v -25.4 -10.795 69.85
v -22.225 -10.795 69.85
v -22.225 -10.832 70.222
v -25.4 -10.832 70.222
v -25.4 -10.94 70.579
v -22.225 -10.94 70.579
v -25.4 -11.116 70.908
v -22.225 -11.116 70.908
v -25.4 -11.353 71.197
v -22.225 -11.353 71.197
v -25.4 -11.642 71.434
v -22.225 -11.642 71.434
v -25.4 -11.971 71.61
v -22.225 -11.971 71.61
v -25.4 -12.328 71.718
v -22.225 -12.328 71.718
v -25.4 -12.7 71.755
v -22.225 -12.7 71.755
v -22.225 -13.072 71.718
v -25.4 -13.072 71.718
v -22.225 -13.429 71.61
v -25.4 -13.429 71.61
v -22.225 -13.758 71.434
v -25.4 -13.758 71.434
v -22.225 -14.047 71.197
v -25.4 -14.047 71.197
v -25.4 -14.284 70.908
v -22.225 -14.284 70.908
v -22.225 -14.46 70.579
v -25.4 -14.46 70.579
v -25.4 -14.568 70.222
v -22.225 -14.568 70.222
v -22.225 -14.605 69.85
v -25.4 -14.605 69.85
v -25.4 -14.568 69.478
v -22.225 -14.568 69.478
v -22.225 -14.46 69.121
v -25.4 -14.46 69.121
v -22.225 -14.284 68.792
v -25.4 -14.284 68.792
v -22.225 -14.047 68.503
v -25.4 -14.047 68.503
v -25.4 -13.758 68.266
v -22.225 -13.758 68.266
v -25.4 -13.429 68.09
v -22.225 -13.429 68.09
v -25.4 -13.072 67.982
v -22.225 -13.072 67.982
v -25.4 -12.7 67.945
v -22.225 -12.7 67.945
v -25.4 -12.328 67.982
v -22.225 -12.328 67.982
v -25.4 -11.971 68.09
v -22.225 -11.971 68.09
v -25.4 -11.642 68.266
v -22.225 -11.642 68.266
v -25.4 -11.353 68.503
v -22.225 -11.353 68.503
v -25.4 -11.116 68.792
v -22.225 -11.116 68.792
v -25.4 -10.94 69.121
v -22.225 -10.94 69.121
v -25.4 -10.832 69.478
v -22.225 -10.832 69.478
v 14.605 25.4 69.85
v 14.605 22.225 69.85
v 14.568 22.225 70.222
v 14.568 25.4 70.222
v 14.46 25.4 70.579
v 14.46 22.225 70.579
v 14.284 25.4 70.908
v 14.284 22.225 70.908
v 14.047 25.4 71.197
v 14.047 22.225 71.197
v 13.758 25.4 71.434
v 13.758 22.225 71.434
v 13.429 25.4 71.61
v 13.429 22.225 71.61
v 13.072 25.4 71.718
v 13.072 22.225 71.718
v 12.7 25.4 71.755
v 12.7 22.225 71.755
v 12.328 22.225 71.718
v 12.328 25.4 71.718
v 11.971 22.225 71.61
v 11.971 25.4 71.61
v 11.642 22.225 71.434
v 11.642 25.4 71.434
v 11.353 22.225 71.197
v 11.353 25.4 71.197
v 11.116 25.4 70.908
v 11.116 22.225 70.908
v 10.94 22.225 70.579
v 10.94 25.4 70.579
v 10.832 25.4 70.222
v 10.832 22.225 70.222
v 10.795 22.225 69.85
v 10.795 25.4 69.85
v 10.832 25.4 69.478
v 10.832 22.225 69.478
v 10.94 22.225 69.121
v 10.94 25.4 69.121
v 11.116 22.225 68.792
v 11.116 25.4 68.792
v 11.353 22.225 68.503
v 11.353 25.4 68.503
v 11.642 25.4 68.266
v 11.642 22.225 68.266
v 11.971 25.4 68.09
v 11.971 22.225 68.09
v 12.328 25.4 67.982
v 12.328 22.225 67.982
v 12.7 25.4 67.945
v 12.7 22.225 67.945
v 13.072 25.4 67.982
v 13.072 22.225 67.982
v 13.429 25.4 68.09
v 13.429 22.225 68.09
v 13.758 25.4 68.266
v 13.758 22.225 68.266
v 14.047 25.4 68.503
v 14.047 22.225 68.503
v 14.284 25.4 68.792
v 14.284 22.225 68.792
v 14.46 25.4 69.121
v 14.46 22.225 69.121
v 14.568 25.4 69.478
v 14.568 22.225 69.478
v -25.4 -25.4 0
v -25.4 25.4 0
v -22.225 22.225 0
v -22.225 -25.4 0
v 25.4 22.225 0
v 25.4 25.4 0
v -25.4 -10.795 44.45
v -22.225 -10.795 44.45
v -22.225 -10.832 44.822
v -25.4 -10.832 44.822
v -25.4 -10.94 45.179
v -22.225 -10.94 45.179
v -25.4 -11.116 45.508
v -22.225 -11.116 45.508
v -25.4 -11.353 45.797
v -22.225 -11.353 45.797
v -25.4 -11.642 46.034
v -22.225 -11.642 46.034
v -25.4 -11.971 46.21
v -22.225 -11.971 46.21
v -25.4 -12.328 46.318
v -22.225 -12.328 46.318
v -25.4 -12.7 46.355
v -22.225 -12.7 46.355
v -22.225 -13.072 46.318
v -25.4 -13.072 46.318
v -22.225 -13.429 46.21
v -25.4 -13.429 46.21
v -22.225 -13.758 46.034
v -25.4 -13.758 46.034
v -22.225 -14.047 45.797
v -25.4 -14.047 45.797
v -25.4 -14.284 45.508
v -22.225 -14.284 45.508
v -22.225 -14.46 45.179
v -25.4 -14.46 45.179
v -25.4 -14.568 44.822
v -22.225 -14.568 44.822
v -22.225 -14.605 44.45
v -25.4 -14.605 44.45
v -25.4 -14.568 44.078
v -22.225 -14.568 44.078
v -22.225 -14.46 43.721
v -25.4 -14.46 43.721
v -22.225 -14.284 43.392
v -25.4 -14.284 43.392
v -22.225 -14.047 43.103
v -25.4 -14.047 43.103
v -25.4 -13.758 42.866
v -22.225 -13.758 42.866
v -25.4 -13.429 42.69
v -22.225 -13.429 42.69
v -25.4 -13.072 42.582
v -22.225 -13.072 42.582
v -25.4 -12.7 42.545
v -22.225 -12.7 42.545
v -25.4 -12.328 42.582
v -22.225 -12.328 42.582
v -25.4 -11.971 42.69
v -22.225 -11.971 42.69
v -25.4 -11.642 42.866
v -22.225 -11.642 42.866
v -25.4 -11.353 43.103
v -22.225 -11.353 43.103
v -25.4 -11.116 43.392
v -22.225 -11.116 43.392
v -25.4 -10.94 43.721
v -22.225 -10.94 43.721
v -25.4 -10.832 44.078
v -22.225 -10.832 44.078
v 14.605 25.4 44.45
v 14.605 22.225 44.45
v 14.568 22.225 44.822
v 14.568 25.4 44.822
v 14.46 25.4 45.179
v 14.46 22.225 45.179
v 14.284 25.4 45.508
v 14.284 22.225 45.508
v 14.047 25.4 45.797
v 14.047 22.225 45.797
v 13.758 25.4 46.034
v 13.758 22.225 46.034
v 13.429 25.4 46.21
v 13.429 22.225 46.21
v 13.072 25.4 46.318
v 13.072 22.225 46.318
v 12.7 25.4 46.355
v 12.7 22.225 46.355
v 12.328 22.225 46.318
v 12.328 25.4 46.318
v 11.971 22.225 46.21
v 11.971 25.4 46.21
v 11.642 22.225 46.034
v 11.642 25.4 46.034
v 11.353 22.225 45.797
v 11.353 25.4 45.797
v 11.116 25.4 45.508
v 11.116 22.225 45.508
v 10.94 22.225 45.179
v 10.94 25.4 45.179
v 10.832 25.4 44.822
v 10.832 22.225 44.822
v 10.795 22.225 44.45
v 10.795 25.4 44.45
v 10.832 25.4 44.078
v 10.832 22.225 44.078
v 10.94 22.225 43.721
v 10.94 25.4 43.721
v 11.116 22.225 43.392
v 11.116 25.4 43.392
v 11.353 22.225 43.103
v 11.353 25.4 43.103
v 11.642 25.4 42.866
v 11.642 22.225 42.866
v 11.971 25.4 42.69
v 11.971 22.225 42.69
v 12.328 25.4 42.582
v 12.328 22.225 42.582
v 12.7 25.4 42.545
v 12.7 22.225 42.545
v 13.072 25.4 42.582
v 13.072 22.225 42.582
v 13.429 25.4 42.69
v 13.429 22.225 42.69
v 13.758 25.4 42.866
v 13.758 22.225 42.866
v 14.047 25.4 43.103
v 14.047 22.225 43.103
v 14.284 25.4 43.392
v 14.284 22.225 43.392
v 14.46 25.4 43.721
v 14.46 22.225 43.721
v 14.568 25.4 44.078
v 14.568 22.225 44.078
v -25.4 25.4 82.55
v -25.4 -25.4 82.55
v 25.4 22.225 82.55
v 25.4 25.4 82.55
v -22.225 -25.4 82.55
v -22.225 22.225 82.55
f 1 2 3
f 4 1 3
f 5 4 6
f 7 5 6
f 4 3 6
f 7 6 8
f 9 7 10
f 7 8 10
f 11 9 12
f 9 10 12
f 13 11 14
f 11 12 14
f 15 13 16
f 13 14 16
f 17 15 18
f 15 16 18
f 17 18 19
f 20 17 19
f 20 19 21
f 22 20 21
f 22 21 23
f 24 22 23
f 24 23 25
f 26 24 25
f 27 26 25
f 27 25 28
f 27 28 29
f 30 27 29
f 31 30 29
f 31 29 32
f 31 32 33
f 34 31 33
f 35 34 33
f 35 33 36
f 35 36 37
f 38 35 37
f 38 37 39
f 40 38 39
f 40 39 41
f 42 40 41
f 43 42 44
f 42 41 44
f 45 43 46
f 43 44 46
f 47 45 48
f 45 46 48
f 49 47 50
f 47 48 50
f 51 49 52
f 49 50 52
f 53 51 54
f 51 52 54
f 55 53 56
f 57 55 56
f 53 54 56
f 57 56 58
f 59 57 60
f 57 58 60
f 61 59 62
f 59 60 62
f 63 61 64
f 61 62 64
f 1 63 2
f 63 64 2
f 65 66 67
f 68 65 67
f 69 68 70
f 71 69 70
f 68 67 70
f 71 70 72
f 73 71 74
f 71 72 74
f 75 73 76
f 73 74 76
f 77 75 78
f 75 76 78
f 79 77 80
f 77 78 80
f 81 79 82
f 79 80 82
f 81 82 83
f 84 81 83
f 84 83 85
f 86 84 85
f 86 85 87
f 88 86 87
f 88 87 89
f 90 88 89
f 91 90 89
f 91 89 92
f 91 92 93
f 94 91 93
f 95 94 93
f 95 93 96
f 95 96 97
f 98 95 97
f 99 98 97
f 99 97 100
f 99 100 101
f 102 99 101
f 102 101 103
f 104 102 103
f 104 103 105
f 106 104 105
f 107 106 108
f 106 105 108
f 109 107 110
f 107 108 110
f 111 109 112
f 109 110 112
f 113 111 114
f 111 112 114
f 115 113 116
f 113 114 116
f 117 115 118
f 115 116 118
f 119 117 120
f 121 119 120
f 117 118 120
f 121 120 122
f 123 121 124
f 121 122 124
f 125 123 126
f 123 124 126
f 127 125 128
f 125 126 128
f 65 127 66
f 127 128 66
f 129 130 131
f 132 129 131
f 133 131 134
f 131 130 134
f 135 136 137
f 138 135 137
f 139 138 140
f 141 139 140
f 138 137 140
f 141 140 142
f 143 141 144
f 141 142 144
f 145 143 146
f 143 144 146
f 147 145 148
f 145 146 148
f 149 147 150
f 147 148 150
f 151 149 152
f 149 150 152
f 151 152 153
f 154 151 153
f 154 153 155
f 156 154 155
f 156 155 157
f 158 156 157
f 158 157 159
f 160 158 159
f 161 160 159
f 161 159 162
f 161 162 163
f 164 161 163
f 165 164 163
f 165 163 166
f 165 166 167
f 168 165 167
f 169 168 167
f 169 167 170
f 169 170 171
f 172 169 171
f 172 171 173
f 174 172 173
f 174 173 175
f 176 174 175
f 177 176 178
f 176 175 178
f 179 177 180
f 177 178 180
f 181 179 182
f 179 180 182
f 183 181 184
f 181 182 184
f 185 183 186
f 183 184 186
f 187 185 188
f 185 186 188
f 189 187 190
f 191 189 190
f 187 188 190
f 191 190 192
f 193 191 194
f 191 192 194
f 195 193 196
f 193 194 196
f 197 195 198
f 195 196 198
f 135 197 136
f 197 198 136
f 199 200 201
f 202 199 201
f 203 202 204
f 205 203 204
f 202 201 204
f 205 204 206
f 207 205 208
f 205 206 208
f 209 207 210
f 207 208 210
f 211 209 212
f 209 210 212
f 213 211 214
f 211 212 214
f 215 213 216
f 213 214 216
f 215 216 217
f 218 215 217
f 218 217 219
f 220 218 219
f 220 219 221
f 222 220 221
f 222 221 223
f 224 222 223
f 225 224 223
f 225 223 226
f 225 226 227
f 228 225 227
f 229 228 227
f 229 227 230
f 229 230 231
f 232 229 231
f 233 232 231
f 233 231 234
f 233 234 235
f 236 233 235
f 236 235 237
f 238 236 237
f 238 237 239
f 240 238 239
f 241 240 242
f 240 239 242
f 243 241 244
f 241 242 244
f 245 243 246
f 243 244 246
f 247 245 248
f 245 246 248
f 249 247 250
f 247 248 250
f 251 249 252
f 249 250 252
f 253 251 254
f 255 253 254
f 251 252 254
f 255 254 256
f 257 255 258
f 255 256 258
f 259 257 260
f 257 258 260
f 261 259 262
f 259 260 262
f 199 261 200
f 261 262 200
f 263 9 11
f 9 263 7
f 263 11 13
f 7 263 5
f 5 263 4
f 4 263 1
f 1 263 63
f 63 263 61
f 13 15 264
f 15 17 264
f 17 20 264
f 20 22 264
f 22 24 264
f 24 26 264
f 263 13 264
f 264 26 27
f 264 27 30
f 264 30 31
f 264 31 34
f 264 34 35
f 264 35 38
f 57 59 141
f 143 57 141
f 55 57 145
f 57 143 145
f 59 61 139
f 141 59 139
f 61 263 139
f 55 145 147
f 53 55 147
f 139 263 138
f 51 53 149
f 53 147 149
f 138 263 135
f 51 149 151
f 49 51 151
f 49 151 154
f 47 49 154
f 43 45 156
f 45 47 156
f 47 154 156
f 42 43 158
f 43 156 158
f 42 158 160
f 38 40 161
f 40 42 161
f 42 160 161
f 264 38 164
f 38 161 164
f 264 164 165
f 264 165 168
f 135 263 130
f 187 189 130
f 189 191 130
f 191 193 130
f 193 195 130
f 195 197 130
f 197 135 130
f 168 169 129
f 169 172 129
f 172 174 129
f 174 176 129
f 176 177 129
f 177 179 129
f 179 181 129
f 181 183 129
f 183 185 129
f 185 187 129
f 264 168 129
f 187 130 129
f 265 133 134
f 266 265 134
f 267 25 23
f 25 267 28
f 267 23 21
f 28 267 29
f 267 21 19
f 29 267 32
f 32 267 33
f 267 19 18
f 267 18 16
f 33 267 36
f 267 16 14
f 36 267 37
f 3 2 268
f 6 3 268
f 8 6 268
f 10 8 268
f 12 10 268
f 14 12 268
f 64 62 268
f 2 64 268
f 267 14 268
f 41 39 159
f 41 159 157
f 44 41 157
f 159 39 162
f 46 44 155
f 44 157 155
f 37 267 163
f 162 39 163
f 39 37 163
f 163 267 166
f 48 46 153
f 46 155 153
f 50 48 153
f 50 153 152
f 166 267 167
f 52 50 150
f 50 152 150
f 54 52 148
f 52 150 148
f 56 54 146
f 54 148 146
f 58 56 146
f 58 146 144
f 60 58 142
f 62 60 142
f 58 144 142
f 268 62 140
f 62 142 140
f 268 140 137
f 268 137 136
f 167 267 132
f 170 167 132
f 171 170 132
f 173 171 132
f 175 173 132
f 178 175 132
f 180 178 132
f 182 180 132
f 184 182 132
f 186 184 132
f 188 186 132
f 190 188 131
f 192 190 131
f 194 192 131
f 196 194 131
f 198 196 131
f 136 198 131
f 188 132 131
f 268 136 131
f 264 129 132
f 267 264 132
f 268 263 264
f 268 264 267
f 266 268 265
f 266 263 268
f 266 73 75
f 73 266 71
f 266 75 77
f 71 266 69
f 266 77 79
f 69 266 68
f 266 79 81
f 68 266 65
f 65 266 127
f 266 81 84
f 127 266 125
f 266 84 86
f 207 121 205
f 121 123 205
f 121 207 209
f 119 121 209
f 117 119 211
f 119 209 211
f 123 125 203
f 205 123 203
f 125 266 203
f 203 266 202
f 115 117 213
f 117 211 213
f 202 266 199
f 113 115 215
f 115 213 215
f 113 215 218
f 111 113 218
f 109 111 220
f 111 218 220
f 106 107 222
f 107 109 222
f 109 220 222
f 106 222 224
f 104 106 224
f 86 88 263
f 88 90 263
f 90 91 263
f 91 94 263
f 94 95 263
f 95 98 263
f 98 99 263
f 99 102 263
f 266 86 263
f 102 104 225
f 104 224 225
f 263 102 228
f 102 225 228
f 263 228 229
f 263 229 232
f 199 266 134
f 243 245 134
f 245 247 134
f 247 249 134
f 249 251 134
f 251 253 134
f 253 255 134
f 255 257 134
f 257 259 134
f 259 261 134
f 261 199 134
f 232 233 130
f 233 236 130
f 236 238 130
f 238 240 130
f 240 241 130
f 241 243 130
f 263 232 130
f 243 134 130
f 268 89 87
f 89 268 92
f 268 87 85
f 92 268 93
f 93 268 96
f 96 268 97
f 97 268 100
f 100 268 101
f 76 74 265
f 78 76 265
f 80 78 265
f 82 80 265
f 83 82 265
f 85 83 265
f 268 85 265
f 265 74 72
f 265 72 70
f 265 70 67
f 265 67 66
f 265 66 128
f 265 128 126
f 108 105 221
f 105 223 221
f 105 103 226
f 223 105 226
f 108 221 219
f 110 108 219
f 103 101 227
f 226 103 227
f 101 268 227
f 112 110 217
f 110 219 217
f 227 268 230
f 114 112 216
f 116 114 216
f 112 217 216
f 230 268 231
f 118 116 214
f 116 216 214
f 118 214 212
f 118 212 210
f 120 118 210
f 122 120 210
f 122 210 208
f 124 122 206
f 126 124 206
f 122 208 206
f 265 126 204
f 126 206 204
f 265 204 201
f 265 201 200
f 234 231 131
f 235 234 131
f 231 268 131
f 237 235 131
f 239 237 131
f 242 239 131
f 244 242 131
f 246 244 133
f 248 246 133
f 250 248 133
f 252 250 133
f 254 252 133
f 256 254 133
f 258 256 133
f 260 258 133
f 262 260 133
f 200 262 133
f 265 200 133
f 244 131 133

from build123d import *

# Parameters (mm, degrees)
F1_DEPTH = 82.55
F3_D     = 3.81
F5_D     = 3.81


with BuildPart() as f1:
    # F0 (on Top) → F1 (new body)
    with BuildSketch(Plane.XY):
        Polygon((25.4, 25.4), (-25.4, 25.4), (-25.4, -25.4), (-22.225, -25.4), (-22.225, 22.225), (25.4, 22.225), align=None)
    extrude(amount=F1_DEPTH)

    # F3 (through all)
    with Locations(Plane(origin=(-25.4, 0, 0), x_dir=(0, -1, 0), z_dir=(-1, 0, 0))):
        with Locations((12.7, 69.85), (12.7, 44.45)):
            Hole(F3_D / 2)

    # F5 (through all)
    with Locations(Plane(origin=(0, 25.4, 0), x_dir=(-1, 0, 0), z_dir=(0, 1, 0))):
        with Locations((-12.7, 69.85), (-12.7, 44.45)):
            Hole(F5_D / 2)


solid = f1.part
